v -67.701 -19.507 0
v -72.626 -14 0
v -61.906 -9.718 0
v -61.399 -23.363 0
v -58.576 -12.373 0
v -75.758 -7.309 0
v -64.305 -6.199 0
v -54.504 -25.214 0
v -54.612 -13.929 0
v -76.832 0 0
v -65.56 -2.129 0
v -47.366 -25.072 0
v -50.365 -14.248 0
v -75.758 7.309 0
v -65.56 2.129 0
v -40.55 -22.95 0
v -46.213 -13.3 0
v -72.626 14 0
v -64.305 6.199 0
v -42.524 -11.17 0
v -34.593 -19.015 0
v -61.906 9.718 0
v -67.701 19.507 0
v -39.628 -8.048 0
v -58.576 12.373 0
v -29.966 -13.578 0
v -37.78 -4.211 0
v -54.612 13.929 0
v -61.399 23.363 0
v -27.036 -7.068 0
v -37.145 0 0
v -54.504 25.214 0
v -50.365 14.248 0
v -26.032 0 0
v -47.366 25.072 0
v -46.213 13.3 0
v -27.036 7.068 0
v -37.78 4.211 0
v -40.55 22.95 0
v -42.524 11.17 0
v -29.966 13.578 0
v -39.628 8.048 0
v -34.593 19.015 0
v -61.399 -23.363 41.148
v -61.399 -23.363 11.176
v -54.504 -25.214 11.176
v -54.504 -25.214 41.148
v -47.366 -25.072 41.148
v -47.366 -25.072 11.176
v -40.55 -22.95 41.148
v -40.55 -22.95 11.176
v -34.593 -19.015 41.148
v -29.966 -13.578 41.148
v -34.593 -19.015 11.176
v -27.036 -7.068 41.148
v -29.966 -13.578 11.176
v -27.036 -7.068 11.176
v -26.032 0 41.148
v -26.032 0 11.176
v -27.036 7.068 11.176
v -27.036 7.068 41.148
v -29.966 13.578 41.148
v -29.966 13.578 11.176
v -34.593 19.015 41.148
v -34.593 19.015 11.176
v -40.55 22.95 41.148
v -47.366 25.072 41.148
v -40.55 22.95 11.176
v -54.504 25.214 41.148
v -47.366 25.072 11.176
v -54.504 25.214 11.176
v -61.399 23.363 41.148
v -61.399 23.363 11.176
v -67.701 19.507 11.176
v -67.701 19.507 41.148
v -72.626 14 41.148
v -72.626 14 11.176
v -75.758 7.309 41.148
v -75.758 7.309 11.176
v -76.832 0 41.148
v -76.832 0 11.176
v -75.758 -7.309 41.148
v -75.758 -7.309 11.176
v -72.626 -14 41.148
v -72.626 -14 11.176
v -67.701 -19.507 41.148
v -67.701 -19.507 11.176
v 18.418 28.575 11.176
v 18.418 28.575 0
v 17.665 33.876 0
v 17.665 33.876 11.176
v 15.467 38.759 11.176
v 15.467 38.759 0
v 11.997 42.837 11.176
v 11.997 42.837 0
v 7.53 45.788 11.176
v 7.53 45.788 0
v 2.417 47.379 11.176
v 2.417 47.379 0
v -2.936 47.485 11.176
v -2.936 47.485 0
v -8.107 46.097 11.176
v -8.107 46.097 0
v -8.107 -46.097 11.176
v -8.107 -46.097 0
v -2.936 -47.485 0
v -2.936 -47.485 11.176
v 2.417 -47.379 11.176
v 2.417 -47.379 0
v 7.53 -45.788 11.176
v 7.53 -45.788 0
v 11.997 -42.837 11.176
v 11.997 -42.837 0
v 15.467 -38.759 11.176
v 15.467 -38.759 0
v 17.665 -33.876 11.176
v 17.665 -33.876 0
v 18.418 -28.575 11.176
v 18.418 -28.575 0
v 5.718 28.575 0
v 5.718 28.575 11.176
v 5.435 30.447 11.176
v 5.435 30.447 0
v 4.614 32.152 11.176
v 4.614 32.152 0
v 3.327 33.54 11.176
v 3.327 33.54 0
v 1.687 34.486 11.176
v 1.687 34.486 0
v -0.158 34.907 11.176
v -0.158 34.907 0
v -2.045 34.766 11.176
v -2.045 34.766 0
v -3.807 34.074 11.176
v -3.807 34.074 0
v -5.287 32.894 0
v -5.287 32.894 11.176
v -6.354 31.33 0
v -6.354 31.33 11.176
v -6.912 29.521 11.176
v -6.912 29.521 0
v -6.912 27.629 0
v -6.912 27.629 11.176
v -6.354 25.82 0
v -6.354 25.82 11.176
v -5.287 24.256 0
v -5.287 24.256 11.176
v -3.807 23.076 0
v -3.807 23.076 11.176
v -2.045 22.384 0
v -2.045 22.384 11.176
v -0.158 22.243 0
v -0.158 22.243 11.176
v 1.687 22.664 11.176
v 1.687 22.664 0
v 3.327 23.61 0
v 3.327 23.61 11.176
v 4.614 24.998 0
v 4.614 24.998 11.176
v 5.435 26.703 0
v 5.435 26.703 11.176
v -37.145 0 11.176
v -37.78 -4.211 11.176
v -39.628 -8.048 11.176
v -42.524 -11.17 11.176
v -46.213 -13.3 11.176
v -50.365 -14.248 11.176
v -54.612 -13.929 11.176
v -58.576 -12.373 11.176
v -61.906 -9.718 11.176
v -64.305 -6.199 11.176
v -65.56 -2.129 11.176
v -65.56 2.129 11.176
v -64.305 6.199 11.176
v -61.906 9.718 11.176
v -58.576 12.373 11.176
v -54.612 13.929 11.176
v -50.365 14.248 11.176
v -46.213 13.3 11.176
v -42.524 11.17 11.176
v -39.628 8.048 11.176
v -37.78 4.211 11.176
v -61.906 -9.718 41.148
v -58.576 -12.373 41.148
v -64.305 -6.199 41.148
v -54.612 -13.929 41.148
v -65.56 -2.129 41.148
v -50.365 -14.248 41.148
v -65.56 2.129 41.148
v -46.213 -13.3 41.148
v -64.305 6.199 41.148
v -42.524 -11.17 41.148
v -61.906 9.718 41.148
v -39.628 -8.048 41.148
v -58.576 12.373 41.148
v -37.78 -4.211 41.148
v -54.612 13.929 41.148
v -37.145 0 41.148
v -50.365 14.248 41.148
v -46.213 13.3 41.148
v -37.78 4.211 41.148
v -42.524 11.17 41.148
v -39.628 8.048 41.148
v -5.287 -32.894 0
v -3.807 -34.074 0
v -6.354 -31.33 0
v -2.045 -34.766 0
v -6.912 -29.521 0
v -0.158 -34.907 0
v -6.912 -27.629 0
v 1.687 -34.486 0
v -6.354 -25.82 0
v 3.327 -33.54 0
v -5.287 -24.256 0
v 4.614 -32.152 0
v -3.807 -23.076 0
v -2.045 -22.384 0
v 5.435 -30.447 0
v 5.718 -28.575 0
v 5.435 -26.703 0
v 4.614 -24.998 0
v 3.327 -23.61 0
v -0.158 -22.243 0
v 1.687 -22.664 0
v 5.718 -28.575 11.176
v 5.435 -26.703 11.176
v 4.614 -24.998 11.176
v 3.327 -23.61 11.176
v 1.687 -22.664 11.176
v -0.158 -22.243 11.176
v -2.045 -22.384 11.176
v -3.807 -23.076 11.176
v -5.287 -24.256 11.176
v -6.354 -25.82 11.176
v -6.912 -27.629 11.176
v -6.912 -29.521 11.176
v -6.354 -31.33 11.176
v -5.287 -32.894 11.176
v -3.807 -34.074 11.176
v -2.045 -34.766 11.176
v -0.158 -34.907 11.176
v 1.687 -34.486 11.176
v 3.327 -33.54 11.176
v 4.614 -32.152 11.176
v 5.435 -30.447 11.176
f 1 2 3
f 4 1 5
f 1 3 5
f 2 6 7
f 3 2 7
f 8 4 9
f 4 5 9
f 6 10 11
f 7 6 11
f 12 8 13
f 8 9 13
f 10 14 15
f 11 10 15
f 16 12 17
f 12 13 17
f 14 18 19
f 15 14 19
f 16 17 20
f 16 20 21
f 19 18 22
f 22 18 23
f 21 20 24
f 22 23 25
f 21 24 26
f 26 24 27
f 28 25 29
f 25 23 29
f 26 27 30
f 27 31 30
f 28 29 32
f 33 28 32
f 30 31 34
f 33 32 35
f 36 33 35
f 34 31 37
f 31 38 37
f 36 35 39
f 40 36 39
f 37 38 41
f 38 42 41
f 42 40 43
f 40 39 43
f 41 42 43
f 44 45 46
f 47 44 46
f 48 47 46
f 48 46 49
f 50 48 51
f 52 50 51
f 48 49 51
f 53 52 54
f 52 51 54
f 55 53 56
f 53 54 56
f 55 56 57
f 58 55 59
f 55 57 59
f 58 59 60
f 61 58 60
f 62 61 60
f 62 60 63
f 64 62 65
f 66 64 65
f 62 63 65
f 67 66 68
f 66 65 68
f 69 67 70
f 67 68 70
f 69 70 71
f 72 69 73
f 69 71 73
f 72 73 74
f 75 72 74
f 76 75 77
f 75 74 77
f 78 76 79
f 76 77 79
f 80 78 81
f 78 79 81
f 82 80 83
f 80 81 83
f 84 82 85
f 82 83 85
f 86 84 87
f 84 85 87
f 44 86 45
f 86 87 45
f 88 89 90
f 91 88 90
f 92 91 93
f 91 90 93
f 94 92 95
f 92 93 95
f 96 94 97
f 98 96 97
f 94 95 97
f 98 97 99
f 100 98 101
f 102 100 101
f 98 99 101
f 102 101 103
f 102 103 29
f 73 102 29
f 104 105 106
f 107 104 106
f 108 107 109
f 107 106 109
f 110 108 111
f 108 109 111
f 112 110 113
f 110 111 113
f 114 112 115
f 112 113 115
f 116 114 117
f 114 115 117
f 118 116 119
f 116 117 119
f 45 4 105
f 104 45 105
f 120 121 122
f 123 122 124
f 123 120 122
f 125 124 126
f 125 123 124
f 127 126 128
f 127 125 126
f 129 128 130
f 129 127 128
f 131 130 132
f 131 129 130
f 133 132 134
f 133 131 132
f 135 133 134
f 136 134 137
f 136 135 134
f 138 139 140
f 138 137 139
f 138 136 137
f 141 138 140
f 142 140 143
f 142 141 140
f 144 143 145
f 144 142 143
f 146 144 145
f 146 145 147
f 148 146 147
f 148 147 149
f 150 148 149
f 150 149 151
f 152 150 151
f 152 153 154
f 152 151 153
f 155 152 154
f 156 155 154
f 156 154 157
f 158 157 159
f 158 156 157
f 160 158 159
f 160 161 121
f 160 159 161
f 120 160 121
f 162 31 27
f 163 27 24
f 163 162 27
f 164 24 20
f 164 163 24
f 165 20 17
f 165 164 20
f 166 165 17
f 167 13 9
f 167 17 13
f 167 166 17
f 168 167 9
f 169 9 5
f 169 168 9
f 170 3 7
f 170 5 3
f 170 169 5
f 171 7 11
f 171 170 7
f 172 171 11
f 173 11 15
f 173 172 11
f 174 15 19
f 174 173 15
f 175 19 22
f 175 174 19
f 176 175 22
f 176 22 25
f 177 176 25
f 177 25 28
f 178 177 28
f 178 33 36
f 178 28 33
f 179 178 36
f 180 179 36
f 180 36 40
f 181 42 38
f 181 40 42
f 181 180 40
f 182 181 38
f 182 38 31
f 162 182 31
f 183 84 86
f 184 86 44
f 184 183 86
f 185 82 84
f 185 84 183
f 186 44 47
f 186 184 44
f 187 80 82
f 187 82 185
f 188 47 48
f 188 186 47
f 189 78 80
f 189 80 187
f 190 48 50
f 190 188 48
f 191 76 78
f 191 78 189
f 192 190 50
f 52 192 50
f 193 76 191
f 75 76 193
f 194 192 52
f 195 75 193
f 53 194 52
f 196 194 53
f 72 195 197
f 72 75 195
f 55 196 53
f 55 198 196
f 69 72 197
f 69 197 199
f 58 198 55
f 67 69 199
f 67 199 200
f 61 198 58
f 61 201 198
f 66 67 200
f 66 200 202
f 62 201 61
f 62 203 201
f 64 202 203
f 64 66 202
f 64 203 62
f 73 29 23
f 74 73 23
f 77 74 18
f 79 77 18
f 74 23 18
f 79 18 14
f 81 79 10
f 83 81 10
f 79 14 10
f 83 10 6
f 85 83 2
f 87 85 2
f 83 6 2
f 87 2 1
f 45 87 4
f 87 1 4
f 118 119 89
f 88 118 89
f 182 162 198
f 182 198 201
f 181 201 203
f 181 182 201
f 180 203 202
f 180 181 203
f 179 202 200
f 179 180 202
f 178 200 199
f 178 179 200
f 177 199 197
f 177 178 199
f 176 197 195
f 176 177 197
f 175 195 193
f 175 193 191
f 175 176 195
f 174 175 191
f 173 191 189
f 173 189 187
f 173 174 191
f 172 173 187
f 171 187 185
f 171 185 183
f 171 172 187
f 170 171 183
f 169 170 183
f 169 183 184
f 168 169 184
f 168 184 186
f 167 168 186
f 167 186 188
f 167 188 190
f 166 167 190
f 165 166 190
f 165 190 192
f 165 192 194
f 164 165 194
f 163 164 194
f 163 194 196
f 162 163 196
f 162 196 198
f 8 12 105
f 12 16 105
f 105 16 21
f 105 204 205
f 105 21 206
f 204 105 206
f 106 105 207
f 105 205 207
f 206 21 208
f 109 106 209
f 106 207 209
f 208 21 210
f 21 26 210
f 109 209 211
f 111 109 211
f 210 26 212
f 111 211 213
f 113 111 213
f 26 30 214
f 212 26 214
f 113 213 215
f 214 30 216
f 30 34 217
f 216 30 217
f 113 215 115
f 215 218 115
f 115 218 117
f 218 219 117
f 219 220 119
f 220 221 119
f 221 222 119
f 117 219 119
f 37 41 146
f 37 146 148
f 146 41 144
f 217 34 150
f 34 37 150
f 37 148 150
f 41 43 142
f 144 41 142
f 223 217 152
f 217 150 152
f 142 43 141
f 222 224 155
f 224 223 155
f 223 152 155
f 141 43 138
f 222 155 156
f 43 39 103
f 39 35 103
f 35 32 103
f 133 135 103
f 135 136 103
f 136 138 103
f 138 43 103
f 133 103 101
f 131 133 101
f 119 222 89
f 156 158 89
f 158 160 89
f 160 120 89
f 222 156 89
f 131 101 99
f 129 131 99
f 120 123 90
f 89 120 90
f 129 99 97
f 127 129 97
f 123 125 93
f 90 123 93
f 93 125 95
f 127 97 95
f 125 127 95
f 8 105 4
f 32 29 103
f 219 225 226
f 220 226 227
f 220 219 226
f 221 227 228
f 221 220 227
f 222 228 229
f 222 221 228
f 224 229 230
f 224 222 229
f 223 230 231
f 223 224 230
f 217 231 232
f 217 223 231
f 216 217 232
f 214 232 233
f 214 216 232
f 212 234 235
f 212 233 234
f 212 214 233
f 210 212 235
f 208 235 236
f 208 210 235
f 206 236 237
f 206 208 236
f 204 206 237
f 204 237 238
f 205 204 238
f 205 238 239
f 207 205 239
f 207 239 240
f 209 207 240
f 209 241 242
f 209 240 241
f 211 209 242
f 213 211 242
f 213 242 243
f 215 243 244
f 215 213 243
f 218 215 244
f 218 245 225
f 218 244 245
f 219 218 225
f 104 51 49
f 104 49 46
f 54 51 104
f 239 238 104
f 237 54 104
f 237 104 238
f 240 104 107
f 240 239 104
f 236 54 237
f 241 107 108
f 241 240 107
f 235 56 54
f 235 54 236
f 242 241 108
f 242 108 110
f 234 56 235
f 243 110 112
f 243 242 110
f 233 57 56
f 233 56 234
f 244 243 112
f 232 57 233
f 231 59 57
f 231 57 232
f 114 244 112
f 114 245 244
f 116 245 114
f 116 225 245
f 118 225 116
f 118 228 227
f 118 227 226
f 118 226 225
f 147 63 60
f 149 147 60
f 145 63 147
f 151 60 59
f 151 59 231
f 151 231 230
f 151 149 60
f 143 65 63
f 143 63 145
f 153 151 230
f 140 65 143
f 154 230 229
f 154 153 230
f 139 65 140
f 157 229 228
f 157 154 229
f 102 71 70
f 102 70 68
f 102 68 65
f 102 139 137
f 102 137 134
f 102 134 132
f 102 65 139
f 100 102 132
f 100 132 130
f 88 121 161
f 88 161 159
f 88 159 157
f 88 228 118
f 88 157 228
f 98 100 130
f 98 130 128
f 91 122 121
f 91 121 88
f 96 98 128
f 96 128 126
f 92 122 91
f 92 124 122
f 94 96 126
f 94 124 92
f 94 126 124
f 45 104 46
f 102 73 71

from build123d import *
from build123d import SkipClean  # not in build123d's __all__

# Parameters (mm, degrees)
F0_R     = 14.2875
F0_R_2   = 6.35
F1_DEPTH = 11.176
F2_DEPTH = 41.148
F3_DEPTH = 11.177
F4_DEPTH = 41.149


with BuildPart() as f1:
    # F0 (on Top) → F1 (new body)
    with BuildSketch(Plane.XY):
        with BuildLine():
            ThreePointArc((-61.399120046, 23.3629201096), (-37.4323475039, 21.1933093342), (-26.0324774843, 0))
            ThreePointArc((-26.0324774843, 0), (-37.4323475039, -21.1933093342), (-61.399120046, -23.3629201096))
            Line((-61.399120046, -23.3629201096), (-8.1074594056, -46.0971900822))
            ThreePointArc((-8.1074594056, -46.0971900822), (-11.1325749696, -12.6800179994), (18.4175225157, -28.575))
            Line((18.4175225157, -28.575), (18.4175225157, 28.575))
            ThreePointArc((18.4175225157, 28.575), (-11.1325749696, 12.6800179994), (-8.1074594056, 46.0971900822))
            Line((-8.1074594056, 46.0971900822), (-61.399120046, 23.3629201096))
        make_face()
        with BuildLine():
            ThreePointArc((-61.399120046, -23.3629201096), (-37.4323475039, -21.1933093342), (-26.0324774843, 0))
            ThreePointArc((-26.0324774843, 0), (-37.4323475039, 21.1933093342), (-61.399120046, 23.3629201096))
            ThreePointArc((-61.399120046, 23.3629201096), (-76.8324774843, 0), (-61.399120046, -23.3629201096))
        make_face()
        with Locations((-51.4324774843, 0)):
            Circle(F0_R, mode=Mode.SUBTRACT)
        with BuildLine():
            ThreePointArc((18.4175225157, 28.575), (9.867620001, 44.4699820006), (-8.1074594056, 46.0971900822))
            ThreePointArc((-8.1074594056, 46.0971900822), (-11.1325749696, 12.6800179994), (18.4175225157, 28.575))
        make_face()
        with Locations((-0.6324774843, 28.575)):
            Circle(F0_R_2, mode=Mode.SUBTRACT)
        with BuildLine():
            ThreePointArc((18.4175225157, -28.575), (-11.1325749696, -12.6800179994), (-8.1074594056, -46.0971900822))
            ThreePointArc((-8.1074594056, -46.0971900822), (9.867620001, -44.4699820006), (18.4175225157, -28.575))
        make_face()
        with Locations((-0.6324774843, -28.575)):
            Circle(F0_R_2, mode=Mode.SUBTRACT)
        with Locations((-51.4324774843, 0)):
            Circle(F0_R)
        with Locations((-0.6324774843, -28.575)):
            Circle(F0_R_2)
        with Locations((-0.6324774843, 28.575)):
            Circle(F0_R_2)
    extrude(amount=F1_DEPTH)

    # F0 (on Top) → F2 (join)
    with BuildSketch(Plane.XY):
        with BuildLine():
            ThreePointArc((-61.399120046, -23.3629201096), (-37.4323475039, -21.1933093342), (-26.0324774843, 0))
            ThreePointArc((-26.0324774843, 0), (-37.4323475039, 21.1933093342), (-61.399120046, 23.3629201096))
            ThreePointArc((-61.399120046, 23.3629201096), (-76.8324774843, 0), (-61.399120046, -23.3629201096))
        make_face()
        with Locations((-51.4324774843, 0)):
            Circle(F0_R, mode=Mode.SUBTRACT)
    with SkipClean():  # cleaning this boolean's faces spoils the solid; the shape is the same uncleaned
        extrude(amount=F2_DEPTH)

    # F3 (cut, through all): a face of the model
    f3_faces = [f1.faces().sort_by_distance(p)[0] for p in [
        (-51.4324774843, 0, 11.176),
    ]]
    with SkipClean():  # cleaning this boolean's faces spoils the solid; the shape is the same uncleaned
        extrude(f3_faces, amount=-F3_DEPTH, mode=Mode.SUBTRACT)

    # F0 (on Top) → F4 (cut, through all)
    with BuildSketch(Plane.XY):
        with Locations((-0.6324774843, 28.575)):
            Circle(F0_R_2)
        with Locations((-0.6324774843, -28.575)):
            Circle(F0_R_2)
    with SkipClean():  # cleaning this boolean's faces spoils the solid; the shape is the same uncleaned
        extrude(amount=F4_DEPTH, mode=Mode.SUBTRACT)


solid = f1.part
